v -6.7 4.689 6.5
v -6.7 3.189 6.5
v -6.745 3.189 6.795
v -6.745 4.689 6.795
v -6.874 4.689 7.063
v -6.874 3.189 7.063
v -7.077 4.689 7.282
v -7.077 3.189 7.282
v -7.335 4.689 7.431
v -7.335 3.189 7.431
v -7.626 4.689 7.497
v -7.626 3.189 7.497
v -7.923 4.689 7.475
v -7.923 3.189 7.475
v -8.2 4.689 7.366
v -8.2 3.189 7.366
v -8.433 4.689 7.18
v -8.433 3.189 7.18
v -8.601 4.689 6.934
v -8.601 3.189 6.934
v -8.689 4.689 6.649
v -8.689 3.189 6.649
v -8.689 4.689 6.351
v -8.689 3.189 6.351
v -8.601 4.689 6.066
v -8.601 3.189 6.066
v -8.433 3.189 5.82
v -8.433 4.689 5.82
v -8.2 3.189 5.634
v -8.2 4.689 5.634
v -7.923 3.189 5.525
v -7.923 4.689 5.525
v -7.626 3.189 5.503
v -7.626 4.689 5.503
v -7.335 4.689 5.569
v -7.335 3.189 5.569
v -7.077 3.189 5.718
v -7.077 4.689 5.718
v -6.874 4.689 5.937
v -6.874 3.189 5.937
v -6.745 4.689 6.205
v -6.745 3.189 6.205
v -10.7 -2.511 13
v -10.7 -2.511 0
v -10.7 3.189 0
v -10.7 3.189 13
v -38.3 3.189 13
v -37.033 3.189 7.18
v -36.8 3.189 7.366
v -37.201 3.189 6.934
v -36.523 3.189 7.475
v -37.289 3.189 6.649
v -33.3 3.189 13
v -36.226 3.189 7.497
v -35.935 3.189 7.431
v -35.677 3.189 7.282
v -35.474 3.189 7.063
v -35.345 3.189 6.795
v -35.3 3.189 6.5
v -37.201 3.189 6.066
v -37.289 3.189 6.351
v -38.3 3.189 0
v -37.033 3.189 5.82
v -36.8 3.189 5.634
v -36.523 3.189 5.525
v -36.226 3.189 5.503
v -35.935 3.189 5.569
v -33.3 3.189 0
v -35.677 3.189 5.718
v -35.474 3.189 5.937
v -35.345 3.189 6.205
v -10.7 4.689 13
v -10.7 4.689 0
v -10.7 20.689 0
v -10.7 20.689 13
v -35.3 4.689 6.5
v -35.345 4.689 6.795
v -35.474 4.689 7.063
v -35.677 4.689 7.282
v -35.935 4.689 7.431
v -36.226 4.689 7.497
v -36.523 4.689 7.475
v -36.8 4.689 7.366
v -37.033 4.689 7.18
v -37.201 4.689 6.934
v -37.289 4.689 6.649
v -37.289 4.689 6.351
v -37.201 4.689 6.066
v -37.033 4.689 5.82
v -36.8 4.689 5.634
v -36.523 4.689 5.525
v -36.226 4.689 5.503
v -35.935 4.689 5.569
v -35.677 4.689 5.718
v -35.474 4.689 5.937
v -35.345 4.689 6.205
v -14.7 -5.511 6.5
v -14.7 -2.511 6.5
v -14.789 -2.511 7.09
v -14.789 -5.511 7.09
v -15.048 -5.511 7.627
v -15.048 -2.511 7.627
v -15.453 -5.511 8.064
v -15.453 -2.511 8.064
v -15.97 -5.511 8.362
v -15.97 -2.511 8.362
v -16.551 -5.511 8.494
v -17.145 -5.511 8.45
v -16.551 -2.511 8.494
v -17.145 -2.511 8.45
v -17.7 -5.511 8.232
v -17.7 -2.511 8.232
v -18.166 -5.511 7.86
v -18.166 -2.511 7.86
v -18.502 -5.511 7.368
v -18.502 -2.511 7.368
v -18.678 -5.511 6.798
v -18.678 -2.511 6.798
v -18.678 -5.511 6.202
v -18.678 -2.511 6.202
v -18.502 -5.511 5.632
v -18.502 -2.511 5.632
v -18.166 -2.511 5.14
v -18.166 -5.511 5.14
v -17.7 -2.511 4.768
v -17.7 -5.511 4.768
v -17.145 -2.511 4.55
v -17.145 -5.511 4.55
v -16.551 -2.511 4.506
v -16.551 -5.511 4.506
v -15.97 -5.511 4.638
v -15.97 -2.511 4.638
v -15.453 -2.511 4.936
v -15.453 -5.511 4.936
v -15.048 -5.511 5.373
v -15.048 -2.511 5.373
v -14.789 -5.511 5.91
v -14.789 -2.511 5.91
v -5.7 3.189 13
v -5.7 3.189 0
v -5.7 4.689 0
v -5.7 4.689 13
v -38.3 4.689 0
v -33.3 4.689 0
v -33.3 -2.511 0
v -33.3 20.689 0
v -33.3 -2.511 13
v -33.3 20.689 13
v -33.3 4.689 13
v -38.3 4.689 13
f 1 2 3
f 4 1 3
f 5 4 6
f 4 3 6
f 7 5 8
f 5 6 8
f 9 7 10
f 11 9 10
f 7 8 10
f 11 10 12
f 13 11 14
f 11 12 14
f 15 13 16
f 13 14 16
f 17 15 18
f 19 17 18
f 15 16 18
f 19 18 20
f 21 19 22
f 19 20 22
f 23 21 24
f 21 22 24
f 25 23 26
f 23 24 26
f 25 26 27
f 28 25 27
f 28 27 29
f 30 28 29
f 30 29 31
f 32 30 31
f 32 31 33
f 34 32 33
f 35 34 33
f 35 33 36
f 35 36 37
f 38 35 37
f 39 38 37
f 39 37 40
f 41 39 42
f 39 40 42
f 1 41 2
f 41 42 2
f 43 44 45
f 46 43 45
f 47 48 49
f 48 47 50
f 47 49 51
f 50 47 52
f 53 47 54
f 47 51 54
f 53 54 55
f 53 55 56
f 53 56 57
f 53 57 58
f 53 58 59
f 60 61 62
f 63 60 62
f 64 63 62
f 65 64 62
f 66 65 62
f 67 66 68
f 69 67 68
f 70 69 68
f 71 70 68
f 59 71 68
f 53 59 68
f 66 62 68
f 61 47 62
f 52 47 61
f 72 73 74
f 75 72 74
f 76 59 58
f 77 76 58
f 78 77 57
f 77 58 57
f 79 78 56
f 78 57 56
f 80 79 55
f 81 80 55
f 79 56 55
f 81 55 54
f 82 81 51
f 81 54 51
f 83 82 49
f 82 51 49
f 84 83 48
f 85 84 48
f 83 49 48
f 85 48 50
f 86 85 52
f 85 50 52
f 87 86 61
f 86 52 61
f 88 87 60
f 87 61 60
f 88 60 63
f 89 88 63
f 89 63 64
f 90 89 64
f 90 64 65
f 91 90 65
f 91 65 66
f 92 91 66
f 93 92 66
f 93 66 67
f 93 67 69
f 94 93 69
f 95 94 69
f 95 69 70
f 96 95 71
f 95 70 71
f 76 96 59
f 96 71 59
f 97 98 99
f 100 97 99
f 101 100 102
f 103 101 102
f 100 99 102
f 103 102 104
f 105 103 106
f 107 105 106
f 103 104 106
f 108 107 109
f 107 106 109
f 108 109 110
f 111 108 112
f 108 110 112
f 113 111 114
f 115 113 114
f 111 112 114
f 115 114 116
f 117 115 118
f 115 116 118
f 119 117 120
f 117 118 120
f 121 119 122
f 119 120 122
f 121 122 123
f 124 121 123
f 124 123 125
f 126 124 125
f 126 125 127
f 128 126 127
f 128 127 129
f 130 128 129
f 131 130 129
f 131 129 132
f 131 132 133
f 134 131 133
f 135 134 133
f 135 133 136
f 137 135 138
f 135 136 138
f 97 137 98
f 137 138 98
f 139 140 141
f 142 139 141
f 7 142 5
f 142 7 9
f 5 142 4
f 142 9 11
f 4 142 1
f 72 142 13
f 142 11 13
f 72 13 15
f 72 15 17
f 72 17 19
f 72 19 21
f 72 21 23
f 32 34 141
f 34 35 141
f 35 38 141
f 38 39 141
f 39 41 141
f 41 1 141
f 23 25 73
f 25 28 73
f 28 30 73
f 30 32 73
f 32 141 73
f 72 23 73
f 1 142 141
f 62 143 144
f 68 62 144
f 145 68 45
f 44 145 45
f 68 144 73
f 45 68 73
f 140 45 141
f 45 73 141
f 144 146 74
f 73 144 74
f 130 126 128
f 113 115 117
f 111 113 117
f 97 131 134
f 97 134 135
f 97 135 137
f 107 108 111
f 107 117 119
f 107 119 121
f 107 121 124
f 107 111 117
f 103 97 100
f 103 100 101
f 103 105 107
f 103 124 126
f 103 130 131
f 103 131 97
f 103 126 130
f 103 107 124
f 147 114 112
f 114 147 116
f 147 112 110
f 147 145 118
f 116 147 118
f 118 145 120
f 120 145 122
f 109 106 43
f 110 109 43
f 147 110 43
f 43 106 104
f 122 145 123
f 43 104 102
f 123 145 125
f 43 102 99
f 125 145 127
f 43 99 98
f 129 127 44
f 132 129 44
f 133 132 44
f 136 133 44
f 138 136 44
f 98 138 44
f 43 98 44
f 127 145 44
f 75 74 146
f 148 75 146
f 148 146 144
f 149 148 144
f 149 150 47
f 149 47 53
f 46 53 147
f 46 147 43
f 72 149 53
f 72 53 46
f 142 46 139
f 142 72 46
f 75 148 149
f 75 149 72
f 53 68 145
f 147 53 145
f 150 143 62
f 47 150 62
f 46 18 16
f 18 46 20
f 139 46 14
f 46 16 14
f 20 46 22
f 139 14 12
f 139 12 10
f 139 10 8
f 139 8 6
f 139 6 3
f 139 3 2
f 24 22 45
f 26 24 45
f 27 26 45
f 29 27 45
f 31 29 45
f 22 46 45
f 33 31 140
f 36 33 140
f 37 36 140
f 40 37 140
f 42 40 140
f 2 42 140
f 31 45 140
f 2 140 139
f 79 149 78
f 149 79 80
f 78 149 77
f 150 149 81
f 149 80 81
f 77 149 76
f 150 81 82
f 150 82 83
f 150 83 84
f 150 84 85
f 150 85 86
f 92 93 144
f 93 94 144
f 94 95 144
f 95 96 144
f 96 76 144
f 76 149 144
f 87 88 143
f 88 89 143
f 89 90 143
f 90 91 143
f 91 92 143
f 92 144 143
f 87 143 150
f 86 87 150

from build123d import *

# Parameters (mm, degrees)
F1_DEPTH = 13
F2_R     = 1
F3_DEPTH = 1.5
F4_R     = 2
F5_DEPTH = 3


with BuildPart() as f1:
    # F0 (on Top) → F1 (new body)
    with BuildSketch(Plane.XY):
        Polygon((-10.700272, 20.6891), (-33.300272, 20.6891), (-33.300272, 4.6891), (-38.300272, 4.6891), (-38.300272, 3.1891), (-33.300272, 3.1891), (-33.300272, -2.5109), (-10.700272, -2.5109), (-10.700272, 3.1891), (-5.700272, 3.1891), (-5.700272, 4.6891), (-10.700272, 4.6891), align=None)
    extrude(amount=F1_DEPTH)

    # F2 (on face) → F3 (cut, through all)
    with BuildSketch(Plane.XZ.offset(-3.1891)):
        with Locations((-36.300272, 6.5)):
            Circle(F2_R)
        with Locations((-7.700272, 6.5)):
            Circle(F2_R)
    extrude(amount=-F3_DEPTH, mode=Mode.SUBTRACT)

    # F4 (on face) → F5 (join)
    with BuildSketch(Plane.XZ.offset(2.5109)):
        with Locations((-16.700272, 6.5)):
            Circle(F4_R)
    extrude(amount=F5_DEPTH)


solid = f1.part
